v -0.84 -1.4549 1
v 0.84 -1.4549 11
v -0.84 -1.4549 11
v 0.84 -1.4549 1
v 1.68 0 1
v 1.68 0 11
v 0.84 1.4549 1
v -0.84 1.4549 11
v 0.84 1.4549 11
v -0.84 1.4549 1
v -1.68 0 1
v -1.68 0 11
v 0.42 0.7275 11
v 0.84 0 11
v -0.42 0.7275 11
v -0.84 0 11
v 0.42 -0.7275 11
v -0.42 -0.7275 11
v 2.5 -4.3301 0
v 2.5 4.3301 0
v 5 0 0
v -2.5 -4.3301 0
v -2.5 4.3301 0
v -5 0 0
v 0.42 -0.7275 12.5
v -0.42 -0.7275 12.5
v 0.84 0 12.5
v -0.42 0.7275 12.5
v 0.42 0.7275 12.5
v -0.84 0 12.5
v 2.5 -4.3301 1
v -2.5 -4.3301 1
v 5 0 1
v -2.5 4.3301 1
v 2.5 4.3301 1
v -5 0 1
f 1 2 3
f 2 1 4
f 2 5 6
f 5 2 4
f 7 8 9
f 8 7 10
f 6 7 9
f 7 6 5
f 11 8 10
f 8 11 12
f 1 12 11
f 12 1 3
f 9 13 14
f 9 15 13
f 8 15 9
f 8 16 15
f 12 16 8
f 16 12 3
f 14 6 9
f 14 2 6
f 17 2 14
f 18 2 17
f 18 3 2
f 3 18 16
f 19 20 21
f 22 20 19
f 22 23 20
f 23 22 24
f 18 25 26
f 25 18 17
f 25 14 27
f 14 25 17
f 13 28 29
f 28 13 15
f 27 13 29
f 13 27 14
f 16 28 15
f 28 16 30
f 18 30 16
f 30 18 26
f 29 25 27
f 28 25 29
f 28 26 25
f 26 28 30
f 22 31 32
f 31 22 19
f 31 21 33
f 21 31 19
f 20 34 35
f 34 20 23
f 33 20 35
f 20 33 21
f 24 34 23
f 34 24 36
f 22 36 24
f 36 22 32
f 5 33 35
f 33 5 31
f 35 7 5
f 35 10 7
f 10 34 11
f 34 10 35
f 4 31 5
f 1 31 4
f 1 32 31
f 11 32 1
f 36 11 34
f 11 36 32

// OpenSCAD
// file: cookie_cutter.scad
module dxf(file, layer, height) {
   linear_extrude(height = height)
       import(file = file, layer = layer);
}

module needle(height, thin1, thin2) {
   union() {
      cylinder(r = thin1, h = height-1.5, $fn = 6);
      cylinder(r = thin2, h = height, $fn = 6);
   }
}

module wall(file, layer, height, thin) {
   difference() {
      minkowski() {
        dxf(file, layer, 0.01);
        cylinder(r = thin, h = height, $fn = 6);
      }
      translate([0, 0, -1]) dxf(file, layer, height + 2);
   }
}

module cutter(file, layer, height, nozzle_diameter) {
   thin1 = nozzle_diameter * 2.4;
   thin2 = nozzle_diameter * 1.2;
   difference() {
      minkowski() {
        dxf(file, layer, 0.01);
        needle(height, thin1, thin2);
      }
      translate([0, 0, -1]) dxf(file, layer, height + 2);
   }
}

module cookie_cutter(file, height, join_height, nozzle_diameter) {
   union () {
      cutter(file, "cutter", height, nozzle_diameter);
      wall(file, "outer", 1, 5);
   }
}

module cookie_cutter_join(file, height, join_height, nozzle_diameter) {
   union () {
      cutter(file, "cutter", height, nozzle_diameter);
      wall(file, "outer", 1, 5);
      linear_extrude(height = join_height)
         import(file = file, layer = "join");
   }
}
// main file
include <cookie_cutter.scad>;
cookie_cutter_join("superman.dxf", 12.5, 1, 0.7);
